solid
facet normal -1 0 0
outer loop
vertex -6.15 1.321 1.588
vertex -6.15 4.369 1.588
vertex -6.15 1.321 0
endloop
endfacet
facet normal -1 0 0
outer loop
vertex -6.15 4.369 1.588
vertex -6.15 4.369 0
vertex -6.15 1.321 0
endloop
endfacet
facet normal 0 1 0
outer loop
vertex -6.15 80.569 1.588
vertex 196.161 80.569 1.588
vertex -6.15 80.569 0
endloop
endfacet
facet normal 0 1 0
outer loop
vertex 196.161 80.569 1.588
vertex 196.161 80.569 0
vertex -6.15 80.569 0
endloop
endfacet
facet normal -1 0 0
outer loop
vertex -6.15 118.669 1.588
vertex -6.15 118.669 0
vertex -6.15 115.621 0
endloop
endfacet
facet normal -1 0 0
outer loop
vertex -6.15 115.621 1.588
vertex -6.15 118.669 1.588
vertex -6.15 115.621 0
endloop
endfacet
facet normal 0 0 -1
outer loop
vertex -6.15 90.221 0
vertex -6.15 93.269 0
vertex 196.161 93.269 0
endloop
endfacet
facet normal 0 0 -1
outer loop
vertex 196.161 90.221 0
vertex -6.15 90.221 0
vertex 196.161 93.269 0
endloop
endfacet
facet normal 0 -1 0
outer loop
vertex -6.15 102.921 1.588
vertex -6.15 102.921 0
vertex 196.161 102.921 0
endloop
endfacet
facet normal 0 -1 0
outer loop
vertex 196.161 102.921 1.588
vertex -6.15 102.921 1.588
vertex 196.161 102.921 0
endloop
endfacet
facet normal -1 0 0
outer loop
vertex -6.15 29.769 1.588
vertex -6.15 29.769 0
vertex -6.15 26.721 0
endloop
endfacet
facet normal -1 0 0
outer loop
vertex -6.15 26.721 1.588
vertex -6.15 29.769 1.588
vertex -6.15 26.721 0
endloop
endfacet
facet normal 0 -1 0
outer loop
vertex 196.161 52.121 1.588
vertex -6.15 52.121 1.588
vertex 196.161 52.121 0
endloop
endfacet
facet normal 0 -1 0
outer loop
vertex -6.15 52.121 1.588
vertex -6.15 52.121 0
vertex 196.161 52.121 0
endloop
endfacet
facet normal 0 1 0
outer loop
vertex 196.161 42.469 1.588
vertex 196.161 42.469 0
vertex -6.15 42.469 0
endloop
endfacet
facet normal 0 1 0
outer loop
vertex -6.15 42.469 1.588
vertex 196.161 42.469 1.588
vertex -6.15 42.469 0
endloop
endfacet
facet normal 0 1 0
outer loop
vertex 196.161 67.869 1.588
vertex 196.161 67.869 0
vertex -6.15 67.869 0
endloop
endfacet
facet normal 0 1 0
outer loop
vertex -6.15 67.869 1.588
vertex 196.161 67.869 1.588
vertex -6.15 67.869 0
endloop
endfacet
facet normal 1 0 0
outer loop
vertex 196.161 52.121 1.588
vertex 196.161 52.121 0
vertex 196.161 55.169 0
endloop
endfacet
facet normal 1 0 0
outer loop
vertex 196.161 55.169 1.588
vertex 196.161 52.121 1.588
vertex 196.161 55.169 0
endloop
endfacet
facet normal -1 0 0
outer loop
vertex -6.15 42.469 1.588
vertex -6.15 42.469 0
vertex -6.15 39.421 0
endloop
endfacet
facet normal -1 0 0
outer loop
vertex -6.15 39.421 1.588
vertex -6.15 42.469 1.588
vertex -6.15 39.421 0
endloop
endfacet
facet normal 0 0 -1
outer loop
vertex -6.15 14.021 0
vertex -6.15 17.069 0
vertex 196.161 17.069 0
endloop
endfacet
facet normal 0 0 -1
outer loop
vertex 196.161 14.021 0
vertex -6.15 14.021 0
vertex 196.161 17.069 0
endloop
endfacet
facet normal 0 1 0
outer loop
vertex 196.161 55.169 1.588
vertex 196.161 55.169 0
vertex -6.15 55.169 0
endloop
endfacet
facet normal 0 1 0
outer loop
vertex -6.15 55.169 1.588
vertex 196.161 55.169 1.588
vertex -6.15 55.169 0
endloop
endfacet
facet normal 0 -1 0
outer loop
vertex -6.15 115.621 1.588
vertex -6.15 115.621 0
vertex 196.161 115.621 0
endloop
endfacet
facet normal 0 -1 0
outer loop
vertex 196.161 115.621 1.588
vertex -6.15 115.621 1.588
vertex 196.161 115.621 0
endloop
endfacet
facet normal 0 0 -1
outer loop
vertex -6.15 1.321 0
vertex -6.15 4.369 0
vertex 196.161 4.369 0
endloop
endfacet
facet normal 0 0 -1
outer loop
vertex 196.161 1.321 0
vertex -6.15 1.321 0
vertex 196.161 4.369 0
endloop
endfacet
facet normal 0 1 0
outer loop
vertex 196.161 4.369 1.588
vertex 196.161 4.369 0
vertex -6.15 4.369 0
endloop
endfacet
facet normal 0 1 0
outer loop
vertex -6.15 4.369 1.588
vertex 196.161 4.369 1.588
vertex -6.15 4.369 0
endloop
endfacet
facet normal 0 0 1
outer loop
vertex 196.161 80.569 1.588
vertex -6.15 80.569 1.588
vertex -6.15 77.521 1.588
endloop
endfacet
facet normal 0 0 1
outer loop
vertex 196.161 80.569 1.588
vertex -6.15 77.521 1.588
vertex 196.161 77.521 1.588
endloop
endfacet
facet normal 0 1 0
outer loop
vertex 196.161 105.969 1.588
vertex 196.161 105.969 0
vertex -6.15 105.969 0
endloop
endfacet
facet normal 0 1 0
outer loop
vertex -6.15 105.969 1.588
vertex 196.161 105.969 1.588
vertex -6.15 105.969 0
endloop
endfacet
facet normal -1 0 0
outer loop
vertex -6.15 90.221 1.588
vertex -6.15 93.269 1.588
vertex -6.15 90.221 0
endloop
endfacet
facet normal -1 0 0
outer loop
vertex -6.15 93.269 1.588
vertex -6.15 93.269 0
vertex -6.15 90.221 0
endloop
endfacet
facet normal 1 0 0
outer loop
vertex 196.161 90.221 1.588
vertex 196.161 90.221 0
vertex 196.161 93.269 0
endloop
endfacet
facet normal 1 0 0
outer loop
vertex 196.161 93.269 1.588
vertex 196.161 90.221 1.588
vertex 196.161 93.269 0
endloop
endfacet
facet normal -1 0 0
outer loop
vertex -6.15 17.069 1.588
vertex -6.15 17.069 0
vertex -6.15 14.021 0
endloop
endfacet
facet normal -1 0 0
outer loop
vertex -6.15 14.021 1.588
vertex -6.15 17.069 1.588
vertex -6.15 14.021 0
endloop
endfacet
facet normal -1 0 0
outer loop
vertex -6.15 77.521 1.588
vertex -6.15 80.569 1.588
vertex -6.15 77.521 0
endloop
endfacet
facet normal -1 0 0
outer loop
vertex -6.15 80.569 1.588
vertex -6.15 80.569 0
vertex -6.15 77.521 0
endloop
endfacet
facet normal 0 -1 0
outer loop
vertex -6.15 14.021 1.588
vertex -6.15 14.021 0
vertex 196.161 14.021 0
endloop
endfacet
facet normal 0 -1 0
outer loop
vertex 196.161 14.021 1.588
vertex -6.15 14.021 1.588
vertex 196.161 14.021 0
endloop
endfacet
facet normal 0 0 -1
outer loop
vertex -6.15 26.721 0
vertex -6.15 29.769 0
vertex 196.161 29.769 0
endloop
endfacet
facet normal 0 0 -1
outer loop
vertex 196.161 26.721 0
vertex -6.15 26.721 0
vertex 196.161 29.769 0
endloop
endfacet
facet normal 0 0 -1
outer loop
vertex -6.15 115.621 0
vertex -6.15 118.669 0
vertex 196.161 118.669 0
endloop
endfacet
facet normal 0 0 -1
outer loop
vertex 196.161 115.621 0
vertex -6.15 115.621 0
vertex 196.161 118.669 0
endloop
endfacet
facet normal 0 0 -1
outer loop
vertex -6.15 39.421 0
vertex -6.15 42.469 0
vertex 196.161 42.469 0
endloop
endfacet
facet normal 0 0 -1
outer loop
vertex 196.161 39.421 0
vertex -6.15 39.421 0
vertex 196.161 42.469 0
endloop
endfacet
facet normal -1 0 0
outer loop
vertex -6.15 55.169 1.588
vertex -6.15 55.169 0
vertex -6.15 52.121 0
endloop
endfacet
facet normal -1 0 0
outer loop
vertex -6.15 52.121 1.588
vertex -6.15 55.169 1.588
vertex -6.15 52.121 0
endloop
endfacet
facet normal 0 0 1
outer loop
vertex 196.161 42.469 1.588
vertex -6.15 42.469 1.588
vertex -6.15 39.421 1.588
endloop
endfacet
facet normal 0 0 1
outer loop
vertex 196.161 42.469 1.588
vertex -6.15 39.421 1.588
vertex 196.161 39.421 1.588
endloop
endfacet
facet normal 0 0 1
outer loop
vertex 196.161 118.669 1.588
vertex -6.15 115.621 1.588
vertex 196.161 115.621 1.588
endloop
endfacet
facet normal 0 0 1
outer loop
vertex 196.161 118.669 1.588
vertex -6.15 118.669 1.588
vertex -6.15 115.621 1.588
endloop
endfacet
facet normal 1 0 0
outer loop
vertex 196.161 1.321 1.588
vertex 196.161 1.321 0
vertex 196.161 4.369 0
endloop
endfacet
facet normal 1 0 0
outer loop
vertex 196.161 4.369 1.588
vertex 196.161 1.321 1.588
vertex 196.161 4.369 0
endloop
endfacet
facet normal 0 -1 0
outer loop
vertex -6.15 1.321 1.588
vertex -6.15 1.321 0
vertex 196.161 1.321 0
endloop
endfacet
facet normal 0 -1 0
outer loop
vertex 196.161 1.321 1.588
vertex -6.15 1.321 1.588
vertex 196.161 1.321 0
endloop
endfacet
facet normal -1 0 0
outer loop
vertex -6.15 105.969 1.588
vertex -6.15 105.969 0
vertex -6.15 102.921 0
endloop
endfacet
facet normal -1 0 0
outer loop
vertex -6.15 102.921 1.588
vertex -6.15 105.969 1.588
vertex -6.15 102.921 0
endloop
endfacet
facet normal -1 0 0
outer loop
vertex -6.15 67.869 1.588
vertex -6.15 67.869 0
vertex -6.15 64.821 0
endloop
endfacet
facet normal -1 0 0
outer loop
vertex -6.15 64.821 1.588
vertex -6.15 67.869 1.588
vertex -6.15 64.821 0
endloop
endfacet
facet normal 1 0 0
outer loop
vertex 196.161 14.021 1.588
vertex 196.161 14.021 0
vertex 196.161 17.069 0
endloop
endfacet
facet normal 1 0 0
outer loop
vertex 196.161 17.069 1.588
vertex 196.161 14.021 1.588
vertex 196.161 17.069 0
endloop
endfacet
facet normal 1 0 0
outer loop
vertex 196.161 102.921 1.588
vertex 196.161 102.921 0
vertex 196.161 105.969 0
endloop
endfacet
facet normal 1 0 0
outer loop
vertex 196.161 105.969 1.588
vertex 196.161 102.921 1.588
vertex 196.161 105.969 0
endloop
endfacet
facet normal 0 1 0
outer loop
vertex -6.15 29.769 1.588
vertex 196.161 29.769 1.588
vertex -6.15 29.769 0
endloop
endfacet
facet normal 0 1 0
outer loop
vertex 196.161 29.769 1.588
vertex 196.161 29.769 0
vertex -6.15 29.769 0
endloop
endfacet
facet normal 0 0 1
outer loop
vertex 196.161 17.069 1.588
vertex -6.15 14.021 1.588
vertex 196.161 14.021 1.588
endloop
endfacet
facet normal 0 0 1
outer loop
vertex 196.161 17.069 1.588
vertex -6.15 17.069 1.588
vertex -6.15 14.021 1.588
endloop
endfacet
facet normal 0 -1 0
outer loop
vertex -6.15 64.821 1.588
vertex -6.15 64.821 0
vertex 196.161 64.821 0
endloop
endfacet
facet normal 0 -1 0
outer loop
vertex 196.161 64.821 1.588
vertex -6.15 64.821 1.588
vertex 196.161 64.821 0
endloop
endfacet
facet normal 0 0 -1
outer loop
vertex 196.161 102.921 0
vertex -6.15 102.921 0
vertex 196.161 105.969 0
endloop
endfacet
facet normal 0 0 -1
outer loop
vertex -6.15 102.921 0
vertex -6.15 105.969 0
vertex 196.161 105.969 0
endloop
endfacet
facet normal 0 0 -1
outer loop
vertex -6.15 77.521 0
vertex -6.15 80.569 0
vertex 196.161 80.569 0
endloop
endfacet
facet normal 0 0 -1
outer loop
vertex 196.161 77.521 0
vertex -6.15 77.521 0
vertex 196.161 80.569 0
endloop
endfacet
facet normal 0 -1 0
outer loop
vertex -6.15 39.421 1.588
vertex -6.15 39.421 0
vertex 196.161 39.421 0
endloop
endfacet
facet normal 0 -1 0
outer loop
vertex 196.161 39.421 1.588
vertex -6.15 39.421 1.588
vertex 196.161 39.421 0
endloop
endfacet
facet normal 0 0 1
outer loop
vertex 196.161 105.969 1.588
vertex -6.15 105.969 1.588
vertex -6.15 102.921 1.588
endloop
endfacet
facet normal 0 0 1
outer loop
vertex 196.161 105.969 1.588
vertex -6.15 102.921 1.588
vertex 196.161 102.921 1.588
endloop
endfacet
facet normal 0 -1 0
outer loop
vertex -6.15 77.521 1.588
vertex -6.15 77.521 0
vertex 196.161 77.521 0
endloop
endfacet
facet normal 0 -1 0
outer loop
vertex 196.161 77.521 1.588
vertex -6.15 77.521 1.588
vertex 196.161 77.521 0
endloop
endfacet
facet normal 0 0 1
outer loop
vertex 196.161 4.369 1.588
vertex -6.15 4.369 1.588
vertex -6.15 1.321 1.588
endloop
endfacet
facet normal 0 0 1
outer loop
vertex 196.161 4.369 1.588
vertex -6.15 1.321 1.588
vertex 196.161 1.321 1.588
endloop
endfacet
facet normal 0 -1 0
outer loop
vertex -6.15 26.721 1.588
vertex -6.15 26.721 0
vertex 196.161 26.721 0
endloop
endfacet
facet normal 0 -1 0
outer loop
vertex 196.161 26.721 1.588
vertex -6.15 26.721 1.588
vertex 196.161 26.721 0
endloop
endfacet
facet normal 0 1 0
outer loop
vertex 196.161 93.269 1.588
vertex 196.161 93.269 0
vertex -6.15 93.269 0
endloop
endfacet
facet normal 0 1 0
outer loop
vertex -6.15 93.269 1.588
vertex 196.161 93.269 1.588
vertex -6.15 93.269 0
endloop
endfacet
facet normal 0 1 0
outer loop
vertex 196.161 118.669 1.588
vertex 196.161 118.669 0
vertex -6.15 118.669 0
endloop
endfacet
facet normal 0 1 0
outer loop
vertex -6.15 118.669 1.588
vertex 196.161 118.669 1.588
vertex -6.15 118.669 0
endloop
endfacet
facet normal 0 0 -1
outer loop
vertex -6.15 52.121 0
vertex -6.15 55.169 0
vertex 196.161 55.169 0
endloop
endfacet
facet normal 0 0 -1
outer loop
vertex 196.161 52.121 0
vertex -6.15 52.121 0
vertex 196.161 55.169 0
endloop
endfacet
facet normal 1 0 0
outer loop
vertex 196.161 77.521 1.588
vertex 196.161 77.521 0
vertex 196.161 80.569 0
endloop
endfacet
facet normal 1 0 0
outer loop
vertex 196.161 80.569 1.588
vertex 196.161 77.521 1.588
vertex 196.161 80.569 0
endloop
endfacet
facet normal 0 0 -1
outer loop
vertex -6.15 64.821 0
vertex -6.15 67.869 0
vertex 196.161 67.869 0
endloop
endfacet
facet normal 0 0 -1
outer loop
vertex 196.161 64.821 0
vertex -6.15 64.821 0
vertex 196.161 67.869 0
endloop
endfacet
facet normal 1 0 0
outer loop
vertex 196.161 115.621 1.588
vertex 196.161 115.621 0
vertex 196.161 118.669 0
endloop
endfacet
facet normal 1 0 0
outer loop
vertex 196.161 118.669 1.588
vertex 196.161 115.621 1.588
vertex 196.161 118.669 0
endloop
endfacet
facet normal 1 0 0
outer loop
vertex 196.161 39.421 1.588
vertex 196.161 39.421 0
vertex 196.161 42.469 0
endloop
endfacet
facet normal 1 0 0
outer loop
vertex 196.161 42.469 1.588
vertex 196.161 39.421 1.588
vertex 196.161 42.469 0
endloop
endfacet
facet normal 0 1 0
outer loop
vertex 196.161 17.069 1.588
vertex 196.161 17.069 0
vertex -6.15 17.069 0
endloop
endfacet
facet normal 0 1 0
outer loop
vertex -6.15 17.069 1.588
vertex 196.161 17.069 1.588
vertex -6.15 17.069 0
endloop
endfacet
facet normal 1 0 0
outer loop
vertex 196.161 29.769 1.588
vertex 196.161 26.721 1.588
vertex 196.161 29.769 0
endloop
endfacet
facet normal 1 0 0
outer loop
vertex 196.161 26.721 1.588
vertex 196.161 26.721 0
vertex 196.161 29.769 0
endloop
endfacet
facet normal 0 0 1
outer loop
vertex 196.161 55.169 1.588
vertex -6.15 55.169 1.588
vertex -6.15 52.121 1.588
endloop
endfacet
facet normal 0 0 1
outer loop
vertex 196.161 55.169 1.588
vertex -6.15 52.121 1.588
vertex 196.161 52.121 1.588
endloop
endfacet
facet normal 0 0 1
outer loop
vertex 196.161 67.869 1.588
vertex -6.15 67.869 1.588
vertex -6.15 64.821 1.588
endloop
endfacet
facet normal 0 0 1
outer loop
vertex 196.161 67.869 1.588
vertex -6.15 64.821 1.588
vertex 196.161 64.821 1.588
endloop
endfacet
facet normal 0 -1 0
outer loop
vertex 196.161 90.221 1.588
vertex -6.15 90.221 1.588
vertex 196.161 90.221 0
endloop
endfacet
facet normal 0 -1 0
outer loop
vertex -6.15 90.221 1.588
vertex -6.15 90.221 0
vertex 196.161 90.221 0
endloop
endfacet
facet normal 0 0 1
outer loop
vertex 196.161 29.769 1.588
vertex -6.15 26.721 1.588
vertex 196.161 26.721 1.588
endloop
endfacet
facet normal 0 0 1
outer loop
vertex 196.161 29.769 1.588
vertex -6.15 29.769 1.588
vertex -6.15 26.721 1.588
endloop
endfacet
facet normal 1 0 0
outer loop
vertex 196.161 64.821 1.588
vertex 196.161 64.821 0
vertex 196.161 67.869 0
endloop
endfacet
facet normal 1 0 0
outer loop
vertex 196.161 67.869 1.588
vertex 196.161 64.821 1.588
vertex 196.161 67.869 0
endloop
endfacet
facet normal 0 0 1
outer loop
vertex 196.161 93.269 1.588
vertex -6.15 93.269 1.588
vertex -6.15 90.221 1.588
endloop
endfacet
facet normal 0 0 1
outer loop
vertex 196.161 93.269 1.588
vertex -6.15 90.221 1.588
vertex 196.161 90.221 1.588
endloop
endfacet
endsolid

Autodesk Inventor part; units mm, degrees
ref_plane "YZ Plane" through (0, 0, 0) normal (1, 0, 0) x (0, 1, 0)
ref_plane "XZ Plane" through (0, 0, 0) normal (0, 1, 0) x (-1, 0, 0)
ref_plane "XY Plane" through (0, 0, 0) normal (0, 0, 1) x (1, 0, 0)
sketch "Sketch1" plane through (0, 0, 0) normal (0, 0, 1) x (1, 0, 0)
  line L0 (-6.1499, 1.3208) -> (196.1611, 1.3208)
  line L1 (196.1611, 1.3208) -> (196.1611, 4.3688)
  line L2 (196.1611, 4.3688) -> (-6.1499, 4.3688)
  line L3 (-6.1499, 4.3688) -> (-6.1499, 1.3208)
  line L4 (-6.1499, 14.0208) -> (196.1611, 14.0208)
  line L5 (196.1611, 14.0208) -> (196.1611, 17.0688)
  line L6 (196.1611, 17.0688) -> (-6.1499, 17.0688)
  line L7 (-6.1499, 17.0688) -> (-6.1499, 14.0208)
  line L8 (196.1611, 29.7688) -> (-6.1499, 29.7688)
  line L9 (-6.1499, 26.7208) -> (196.1611, 26.7208)
  line L10 (-6.1499, 29.7688) -> (-6.1499, 26.7208)
  line L11 (196.1611, 26.7208) -> (196.1611, 29.7688)
  line L12 (196.1611, 42.4688) -> (-6.1499, 42.4688)
  line L13 (-6.1499, 39.4208) -> (196.1611, 39.4208)
  line L14 (-6.1499, 42.4688) -> (-6.1499, 39.4208)
  line L15 (196.1611, 39.4208) -> (196.1611, 42.4688)
  line L16 (196.1611, 55.1688) -> (-6.1499, 55.1688)
  line L17 (-6.1499, 52.1208) -> (196.1611, 52.1208)
  line L18 (-6.1499, 55.1688) -> (-6.1499, 52.1208)
  line L19 (196.1611, 52.1208) -> (196.1611, 55.1688)
  line L20 (196.1611, 67.8688) -> (-6.1499, 67.8688)
  line L21 (-6.1499, 64.8208) -> (196.1611, 64.8208)
  line L22 (-6.1499, 67.8688) -> (-6.1499, 64.8208)
  line L23 (196.1611, 64.8208) -> (196.1611, 67.8688)
  line L24 (196.1611, 80.5688) -> (-6.1499, 80.5688)
  line L25 (-6.1499, 77.5208) -> (196.1611, 77.5208)
  line L26 (-6.1499, 80.5688) -> (-6.1499, 77.5208)
  line L27 (196.1611, 77.5208) -> (196.1611, 80.5688)
  line L28 (196.1611, 93.2688) -> (-6.1499, 93.2688)
  line L29 (-6.1499, 90.2208) -> (196.1611, 90.2208)
  line L30 (-6.1499, 93.2688) -> (-6.1499, 90.2208)
  line L31 (196.1611, 90.2208) -> (196.1611, 93.2688)
  line L32 (196.1611, 105.9688) -> (-6.1499, 105.9688)
  line L33 (-6.1499, 102.9208) -> (196.1611, 102.9208)
  line L34 (-6.1499, 105.9688) -> (-6.1499, 102.9208)
  line L35 (196.1611, 102.9208) -> (196.1611, 105.9688)
  line L36 (196.1611, 118.6688) -> (-6.1499, 118.6688)
  line L37 (-6.1499, 115.6208) -> (196.1611, 115.6208)
  line L38 (-6.1499, 118.6688) -> (-6.1499, 115.6208)
  line L39 (196.1611, 115.6208) -> (196.1611, 118.6688)
  point P0 (0, 0)
  dimension "d0" = 202.311
  dimension "d1" = 3.048
  dimension "d2" = 12.7
  dimension "d3" = 202.311
  dimension "d4" = 3.048
  dimension "d7" = 12.7
extrude "Extrusion1" add sketch "Sketch1" along normal blind 1.5875
properties part number "rampbands"
